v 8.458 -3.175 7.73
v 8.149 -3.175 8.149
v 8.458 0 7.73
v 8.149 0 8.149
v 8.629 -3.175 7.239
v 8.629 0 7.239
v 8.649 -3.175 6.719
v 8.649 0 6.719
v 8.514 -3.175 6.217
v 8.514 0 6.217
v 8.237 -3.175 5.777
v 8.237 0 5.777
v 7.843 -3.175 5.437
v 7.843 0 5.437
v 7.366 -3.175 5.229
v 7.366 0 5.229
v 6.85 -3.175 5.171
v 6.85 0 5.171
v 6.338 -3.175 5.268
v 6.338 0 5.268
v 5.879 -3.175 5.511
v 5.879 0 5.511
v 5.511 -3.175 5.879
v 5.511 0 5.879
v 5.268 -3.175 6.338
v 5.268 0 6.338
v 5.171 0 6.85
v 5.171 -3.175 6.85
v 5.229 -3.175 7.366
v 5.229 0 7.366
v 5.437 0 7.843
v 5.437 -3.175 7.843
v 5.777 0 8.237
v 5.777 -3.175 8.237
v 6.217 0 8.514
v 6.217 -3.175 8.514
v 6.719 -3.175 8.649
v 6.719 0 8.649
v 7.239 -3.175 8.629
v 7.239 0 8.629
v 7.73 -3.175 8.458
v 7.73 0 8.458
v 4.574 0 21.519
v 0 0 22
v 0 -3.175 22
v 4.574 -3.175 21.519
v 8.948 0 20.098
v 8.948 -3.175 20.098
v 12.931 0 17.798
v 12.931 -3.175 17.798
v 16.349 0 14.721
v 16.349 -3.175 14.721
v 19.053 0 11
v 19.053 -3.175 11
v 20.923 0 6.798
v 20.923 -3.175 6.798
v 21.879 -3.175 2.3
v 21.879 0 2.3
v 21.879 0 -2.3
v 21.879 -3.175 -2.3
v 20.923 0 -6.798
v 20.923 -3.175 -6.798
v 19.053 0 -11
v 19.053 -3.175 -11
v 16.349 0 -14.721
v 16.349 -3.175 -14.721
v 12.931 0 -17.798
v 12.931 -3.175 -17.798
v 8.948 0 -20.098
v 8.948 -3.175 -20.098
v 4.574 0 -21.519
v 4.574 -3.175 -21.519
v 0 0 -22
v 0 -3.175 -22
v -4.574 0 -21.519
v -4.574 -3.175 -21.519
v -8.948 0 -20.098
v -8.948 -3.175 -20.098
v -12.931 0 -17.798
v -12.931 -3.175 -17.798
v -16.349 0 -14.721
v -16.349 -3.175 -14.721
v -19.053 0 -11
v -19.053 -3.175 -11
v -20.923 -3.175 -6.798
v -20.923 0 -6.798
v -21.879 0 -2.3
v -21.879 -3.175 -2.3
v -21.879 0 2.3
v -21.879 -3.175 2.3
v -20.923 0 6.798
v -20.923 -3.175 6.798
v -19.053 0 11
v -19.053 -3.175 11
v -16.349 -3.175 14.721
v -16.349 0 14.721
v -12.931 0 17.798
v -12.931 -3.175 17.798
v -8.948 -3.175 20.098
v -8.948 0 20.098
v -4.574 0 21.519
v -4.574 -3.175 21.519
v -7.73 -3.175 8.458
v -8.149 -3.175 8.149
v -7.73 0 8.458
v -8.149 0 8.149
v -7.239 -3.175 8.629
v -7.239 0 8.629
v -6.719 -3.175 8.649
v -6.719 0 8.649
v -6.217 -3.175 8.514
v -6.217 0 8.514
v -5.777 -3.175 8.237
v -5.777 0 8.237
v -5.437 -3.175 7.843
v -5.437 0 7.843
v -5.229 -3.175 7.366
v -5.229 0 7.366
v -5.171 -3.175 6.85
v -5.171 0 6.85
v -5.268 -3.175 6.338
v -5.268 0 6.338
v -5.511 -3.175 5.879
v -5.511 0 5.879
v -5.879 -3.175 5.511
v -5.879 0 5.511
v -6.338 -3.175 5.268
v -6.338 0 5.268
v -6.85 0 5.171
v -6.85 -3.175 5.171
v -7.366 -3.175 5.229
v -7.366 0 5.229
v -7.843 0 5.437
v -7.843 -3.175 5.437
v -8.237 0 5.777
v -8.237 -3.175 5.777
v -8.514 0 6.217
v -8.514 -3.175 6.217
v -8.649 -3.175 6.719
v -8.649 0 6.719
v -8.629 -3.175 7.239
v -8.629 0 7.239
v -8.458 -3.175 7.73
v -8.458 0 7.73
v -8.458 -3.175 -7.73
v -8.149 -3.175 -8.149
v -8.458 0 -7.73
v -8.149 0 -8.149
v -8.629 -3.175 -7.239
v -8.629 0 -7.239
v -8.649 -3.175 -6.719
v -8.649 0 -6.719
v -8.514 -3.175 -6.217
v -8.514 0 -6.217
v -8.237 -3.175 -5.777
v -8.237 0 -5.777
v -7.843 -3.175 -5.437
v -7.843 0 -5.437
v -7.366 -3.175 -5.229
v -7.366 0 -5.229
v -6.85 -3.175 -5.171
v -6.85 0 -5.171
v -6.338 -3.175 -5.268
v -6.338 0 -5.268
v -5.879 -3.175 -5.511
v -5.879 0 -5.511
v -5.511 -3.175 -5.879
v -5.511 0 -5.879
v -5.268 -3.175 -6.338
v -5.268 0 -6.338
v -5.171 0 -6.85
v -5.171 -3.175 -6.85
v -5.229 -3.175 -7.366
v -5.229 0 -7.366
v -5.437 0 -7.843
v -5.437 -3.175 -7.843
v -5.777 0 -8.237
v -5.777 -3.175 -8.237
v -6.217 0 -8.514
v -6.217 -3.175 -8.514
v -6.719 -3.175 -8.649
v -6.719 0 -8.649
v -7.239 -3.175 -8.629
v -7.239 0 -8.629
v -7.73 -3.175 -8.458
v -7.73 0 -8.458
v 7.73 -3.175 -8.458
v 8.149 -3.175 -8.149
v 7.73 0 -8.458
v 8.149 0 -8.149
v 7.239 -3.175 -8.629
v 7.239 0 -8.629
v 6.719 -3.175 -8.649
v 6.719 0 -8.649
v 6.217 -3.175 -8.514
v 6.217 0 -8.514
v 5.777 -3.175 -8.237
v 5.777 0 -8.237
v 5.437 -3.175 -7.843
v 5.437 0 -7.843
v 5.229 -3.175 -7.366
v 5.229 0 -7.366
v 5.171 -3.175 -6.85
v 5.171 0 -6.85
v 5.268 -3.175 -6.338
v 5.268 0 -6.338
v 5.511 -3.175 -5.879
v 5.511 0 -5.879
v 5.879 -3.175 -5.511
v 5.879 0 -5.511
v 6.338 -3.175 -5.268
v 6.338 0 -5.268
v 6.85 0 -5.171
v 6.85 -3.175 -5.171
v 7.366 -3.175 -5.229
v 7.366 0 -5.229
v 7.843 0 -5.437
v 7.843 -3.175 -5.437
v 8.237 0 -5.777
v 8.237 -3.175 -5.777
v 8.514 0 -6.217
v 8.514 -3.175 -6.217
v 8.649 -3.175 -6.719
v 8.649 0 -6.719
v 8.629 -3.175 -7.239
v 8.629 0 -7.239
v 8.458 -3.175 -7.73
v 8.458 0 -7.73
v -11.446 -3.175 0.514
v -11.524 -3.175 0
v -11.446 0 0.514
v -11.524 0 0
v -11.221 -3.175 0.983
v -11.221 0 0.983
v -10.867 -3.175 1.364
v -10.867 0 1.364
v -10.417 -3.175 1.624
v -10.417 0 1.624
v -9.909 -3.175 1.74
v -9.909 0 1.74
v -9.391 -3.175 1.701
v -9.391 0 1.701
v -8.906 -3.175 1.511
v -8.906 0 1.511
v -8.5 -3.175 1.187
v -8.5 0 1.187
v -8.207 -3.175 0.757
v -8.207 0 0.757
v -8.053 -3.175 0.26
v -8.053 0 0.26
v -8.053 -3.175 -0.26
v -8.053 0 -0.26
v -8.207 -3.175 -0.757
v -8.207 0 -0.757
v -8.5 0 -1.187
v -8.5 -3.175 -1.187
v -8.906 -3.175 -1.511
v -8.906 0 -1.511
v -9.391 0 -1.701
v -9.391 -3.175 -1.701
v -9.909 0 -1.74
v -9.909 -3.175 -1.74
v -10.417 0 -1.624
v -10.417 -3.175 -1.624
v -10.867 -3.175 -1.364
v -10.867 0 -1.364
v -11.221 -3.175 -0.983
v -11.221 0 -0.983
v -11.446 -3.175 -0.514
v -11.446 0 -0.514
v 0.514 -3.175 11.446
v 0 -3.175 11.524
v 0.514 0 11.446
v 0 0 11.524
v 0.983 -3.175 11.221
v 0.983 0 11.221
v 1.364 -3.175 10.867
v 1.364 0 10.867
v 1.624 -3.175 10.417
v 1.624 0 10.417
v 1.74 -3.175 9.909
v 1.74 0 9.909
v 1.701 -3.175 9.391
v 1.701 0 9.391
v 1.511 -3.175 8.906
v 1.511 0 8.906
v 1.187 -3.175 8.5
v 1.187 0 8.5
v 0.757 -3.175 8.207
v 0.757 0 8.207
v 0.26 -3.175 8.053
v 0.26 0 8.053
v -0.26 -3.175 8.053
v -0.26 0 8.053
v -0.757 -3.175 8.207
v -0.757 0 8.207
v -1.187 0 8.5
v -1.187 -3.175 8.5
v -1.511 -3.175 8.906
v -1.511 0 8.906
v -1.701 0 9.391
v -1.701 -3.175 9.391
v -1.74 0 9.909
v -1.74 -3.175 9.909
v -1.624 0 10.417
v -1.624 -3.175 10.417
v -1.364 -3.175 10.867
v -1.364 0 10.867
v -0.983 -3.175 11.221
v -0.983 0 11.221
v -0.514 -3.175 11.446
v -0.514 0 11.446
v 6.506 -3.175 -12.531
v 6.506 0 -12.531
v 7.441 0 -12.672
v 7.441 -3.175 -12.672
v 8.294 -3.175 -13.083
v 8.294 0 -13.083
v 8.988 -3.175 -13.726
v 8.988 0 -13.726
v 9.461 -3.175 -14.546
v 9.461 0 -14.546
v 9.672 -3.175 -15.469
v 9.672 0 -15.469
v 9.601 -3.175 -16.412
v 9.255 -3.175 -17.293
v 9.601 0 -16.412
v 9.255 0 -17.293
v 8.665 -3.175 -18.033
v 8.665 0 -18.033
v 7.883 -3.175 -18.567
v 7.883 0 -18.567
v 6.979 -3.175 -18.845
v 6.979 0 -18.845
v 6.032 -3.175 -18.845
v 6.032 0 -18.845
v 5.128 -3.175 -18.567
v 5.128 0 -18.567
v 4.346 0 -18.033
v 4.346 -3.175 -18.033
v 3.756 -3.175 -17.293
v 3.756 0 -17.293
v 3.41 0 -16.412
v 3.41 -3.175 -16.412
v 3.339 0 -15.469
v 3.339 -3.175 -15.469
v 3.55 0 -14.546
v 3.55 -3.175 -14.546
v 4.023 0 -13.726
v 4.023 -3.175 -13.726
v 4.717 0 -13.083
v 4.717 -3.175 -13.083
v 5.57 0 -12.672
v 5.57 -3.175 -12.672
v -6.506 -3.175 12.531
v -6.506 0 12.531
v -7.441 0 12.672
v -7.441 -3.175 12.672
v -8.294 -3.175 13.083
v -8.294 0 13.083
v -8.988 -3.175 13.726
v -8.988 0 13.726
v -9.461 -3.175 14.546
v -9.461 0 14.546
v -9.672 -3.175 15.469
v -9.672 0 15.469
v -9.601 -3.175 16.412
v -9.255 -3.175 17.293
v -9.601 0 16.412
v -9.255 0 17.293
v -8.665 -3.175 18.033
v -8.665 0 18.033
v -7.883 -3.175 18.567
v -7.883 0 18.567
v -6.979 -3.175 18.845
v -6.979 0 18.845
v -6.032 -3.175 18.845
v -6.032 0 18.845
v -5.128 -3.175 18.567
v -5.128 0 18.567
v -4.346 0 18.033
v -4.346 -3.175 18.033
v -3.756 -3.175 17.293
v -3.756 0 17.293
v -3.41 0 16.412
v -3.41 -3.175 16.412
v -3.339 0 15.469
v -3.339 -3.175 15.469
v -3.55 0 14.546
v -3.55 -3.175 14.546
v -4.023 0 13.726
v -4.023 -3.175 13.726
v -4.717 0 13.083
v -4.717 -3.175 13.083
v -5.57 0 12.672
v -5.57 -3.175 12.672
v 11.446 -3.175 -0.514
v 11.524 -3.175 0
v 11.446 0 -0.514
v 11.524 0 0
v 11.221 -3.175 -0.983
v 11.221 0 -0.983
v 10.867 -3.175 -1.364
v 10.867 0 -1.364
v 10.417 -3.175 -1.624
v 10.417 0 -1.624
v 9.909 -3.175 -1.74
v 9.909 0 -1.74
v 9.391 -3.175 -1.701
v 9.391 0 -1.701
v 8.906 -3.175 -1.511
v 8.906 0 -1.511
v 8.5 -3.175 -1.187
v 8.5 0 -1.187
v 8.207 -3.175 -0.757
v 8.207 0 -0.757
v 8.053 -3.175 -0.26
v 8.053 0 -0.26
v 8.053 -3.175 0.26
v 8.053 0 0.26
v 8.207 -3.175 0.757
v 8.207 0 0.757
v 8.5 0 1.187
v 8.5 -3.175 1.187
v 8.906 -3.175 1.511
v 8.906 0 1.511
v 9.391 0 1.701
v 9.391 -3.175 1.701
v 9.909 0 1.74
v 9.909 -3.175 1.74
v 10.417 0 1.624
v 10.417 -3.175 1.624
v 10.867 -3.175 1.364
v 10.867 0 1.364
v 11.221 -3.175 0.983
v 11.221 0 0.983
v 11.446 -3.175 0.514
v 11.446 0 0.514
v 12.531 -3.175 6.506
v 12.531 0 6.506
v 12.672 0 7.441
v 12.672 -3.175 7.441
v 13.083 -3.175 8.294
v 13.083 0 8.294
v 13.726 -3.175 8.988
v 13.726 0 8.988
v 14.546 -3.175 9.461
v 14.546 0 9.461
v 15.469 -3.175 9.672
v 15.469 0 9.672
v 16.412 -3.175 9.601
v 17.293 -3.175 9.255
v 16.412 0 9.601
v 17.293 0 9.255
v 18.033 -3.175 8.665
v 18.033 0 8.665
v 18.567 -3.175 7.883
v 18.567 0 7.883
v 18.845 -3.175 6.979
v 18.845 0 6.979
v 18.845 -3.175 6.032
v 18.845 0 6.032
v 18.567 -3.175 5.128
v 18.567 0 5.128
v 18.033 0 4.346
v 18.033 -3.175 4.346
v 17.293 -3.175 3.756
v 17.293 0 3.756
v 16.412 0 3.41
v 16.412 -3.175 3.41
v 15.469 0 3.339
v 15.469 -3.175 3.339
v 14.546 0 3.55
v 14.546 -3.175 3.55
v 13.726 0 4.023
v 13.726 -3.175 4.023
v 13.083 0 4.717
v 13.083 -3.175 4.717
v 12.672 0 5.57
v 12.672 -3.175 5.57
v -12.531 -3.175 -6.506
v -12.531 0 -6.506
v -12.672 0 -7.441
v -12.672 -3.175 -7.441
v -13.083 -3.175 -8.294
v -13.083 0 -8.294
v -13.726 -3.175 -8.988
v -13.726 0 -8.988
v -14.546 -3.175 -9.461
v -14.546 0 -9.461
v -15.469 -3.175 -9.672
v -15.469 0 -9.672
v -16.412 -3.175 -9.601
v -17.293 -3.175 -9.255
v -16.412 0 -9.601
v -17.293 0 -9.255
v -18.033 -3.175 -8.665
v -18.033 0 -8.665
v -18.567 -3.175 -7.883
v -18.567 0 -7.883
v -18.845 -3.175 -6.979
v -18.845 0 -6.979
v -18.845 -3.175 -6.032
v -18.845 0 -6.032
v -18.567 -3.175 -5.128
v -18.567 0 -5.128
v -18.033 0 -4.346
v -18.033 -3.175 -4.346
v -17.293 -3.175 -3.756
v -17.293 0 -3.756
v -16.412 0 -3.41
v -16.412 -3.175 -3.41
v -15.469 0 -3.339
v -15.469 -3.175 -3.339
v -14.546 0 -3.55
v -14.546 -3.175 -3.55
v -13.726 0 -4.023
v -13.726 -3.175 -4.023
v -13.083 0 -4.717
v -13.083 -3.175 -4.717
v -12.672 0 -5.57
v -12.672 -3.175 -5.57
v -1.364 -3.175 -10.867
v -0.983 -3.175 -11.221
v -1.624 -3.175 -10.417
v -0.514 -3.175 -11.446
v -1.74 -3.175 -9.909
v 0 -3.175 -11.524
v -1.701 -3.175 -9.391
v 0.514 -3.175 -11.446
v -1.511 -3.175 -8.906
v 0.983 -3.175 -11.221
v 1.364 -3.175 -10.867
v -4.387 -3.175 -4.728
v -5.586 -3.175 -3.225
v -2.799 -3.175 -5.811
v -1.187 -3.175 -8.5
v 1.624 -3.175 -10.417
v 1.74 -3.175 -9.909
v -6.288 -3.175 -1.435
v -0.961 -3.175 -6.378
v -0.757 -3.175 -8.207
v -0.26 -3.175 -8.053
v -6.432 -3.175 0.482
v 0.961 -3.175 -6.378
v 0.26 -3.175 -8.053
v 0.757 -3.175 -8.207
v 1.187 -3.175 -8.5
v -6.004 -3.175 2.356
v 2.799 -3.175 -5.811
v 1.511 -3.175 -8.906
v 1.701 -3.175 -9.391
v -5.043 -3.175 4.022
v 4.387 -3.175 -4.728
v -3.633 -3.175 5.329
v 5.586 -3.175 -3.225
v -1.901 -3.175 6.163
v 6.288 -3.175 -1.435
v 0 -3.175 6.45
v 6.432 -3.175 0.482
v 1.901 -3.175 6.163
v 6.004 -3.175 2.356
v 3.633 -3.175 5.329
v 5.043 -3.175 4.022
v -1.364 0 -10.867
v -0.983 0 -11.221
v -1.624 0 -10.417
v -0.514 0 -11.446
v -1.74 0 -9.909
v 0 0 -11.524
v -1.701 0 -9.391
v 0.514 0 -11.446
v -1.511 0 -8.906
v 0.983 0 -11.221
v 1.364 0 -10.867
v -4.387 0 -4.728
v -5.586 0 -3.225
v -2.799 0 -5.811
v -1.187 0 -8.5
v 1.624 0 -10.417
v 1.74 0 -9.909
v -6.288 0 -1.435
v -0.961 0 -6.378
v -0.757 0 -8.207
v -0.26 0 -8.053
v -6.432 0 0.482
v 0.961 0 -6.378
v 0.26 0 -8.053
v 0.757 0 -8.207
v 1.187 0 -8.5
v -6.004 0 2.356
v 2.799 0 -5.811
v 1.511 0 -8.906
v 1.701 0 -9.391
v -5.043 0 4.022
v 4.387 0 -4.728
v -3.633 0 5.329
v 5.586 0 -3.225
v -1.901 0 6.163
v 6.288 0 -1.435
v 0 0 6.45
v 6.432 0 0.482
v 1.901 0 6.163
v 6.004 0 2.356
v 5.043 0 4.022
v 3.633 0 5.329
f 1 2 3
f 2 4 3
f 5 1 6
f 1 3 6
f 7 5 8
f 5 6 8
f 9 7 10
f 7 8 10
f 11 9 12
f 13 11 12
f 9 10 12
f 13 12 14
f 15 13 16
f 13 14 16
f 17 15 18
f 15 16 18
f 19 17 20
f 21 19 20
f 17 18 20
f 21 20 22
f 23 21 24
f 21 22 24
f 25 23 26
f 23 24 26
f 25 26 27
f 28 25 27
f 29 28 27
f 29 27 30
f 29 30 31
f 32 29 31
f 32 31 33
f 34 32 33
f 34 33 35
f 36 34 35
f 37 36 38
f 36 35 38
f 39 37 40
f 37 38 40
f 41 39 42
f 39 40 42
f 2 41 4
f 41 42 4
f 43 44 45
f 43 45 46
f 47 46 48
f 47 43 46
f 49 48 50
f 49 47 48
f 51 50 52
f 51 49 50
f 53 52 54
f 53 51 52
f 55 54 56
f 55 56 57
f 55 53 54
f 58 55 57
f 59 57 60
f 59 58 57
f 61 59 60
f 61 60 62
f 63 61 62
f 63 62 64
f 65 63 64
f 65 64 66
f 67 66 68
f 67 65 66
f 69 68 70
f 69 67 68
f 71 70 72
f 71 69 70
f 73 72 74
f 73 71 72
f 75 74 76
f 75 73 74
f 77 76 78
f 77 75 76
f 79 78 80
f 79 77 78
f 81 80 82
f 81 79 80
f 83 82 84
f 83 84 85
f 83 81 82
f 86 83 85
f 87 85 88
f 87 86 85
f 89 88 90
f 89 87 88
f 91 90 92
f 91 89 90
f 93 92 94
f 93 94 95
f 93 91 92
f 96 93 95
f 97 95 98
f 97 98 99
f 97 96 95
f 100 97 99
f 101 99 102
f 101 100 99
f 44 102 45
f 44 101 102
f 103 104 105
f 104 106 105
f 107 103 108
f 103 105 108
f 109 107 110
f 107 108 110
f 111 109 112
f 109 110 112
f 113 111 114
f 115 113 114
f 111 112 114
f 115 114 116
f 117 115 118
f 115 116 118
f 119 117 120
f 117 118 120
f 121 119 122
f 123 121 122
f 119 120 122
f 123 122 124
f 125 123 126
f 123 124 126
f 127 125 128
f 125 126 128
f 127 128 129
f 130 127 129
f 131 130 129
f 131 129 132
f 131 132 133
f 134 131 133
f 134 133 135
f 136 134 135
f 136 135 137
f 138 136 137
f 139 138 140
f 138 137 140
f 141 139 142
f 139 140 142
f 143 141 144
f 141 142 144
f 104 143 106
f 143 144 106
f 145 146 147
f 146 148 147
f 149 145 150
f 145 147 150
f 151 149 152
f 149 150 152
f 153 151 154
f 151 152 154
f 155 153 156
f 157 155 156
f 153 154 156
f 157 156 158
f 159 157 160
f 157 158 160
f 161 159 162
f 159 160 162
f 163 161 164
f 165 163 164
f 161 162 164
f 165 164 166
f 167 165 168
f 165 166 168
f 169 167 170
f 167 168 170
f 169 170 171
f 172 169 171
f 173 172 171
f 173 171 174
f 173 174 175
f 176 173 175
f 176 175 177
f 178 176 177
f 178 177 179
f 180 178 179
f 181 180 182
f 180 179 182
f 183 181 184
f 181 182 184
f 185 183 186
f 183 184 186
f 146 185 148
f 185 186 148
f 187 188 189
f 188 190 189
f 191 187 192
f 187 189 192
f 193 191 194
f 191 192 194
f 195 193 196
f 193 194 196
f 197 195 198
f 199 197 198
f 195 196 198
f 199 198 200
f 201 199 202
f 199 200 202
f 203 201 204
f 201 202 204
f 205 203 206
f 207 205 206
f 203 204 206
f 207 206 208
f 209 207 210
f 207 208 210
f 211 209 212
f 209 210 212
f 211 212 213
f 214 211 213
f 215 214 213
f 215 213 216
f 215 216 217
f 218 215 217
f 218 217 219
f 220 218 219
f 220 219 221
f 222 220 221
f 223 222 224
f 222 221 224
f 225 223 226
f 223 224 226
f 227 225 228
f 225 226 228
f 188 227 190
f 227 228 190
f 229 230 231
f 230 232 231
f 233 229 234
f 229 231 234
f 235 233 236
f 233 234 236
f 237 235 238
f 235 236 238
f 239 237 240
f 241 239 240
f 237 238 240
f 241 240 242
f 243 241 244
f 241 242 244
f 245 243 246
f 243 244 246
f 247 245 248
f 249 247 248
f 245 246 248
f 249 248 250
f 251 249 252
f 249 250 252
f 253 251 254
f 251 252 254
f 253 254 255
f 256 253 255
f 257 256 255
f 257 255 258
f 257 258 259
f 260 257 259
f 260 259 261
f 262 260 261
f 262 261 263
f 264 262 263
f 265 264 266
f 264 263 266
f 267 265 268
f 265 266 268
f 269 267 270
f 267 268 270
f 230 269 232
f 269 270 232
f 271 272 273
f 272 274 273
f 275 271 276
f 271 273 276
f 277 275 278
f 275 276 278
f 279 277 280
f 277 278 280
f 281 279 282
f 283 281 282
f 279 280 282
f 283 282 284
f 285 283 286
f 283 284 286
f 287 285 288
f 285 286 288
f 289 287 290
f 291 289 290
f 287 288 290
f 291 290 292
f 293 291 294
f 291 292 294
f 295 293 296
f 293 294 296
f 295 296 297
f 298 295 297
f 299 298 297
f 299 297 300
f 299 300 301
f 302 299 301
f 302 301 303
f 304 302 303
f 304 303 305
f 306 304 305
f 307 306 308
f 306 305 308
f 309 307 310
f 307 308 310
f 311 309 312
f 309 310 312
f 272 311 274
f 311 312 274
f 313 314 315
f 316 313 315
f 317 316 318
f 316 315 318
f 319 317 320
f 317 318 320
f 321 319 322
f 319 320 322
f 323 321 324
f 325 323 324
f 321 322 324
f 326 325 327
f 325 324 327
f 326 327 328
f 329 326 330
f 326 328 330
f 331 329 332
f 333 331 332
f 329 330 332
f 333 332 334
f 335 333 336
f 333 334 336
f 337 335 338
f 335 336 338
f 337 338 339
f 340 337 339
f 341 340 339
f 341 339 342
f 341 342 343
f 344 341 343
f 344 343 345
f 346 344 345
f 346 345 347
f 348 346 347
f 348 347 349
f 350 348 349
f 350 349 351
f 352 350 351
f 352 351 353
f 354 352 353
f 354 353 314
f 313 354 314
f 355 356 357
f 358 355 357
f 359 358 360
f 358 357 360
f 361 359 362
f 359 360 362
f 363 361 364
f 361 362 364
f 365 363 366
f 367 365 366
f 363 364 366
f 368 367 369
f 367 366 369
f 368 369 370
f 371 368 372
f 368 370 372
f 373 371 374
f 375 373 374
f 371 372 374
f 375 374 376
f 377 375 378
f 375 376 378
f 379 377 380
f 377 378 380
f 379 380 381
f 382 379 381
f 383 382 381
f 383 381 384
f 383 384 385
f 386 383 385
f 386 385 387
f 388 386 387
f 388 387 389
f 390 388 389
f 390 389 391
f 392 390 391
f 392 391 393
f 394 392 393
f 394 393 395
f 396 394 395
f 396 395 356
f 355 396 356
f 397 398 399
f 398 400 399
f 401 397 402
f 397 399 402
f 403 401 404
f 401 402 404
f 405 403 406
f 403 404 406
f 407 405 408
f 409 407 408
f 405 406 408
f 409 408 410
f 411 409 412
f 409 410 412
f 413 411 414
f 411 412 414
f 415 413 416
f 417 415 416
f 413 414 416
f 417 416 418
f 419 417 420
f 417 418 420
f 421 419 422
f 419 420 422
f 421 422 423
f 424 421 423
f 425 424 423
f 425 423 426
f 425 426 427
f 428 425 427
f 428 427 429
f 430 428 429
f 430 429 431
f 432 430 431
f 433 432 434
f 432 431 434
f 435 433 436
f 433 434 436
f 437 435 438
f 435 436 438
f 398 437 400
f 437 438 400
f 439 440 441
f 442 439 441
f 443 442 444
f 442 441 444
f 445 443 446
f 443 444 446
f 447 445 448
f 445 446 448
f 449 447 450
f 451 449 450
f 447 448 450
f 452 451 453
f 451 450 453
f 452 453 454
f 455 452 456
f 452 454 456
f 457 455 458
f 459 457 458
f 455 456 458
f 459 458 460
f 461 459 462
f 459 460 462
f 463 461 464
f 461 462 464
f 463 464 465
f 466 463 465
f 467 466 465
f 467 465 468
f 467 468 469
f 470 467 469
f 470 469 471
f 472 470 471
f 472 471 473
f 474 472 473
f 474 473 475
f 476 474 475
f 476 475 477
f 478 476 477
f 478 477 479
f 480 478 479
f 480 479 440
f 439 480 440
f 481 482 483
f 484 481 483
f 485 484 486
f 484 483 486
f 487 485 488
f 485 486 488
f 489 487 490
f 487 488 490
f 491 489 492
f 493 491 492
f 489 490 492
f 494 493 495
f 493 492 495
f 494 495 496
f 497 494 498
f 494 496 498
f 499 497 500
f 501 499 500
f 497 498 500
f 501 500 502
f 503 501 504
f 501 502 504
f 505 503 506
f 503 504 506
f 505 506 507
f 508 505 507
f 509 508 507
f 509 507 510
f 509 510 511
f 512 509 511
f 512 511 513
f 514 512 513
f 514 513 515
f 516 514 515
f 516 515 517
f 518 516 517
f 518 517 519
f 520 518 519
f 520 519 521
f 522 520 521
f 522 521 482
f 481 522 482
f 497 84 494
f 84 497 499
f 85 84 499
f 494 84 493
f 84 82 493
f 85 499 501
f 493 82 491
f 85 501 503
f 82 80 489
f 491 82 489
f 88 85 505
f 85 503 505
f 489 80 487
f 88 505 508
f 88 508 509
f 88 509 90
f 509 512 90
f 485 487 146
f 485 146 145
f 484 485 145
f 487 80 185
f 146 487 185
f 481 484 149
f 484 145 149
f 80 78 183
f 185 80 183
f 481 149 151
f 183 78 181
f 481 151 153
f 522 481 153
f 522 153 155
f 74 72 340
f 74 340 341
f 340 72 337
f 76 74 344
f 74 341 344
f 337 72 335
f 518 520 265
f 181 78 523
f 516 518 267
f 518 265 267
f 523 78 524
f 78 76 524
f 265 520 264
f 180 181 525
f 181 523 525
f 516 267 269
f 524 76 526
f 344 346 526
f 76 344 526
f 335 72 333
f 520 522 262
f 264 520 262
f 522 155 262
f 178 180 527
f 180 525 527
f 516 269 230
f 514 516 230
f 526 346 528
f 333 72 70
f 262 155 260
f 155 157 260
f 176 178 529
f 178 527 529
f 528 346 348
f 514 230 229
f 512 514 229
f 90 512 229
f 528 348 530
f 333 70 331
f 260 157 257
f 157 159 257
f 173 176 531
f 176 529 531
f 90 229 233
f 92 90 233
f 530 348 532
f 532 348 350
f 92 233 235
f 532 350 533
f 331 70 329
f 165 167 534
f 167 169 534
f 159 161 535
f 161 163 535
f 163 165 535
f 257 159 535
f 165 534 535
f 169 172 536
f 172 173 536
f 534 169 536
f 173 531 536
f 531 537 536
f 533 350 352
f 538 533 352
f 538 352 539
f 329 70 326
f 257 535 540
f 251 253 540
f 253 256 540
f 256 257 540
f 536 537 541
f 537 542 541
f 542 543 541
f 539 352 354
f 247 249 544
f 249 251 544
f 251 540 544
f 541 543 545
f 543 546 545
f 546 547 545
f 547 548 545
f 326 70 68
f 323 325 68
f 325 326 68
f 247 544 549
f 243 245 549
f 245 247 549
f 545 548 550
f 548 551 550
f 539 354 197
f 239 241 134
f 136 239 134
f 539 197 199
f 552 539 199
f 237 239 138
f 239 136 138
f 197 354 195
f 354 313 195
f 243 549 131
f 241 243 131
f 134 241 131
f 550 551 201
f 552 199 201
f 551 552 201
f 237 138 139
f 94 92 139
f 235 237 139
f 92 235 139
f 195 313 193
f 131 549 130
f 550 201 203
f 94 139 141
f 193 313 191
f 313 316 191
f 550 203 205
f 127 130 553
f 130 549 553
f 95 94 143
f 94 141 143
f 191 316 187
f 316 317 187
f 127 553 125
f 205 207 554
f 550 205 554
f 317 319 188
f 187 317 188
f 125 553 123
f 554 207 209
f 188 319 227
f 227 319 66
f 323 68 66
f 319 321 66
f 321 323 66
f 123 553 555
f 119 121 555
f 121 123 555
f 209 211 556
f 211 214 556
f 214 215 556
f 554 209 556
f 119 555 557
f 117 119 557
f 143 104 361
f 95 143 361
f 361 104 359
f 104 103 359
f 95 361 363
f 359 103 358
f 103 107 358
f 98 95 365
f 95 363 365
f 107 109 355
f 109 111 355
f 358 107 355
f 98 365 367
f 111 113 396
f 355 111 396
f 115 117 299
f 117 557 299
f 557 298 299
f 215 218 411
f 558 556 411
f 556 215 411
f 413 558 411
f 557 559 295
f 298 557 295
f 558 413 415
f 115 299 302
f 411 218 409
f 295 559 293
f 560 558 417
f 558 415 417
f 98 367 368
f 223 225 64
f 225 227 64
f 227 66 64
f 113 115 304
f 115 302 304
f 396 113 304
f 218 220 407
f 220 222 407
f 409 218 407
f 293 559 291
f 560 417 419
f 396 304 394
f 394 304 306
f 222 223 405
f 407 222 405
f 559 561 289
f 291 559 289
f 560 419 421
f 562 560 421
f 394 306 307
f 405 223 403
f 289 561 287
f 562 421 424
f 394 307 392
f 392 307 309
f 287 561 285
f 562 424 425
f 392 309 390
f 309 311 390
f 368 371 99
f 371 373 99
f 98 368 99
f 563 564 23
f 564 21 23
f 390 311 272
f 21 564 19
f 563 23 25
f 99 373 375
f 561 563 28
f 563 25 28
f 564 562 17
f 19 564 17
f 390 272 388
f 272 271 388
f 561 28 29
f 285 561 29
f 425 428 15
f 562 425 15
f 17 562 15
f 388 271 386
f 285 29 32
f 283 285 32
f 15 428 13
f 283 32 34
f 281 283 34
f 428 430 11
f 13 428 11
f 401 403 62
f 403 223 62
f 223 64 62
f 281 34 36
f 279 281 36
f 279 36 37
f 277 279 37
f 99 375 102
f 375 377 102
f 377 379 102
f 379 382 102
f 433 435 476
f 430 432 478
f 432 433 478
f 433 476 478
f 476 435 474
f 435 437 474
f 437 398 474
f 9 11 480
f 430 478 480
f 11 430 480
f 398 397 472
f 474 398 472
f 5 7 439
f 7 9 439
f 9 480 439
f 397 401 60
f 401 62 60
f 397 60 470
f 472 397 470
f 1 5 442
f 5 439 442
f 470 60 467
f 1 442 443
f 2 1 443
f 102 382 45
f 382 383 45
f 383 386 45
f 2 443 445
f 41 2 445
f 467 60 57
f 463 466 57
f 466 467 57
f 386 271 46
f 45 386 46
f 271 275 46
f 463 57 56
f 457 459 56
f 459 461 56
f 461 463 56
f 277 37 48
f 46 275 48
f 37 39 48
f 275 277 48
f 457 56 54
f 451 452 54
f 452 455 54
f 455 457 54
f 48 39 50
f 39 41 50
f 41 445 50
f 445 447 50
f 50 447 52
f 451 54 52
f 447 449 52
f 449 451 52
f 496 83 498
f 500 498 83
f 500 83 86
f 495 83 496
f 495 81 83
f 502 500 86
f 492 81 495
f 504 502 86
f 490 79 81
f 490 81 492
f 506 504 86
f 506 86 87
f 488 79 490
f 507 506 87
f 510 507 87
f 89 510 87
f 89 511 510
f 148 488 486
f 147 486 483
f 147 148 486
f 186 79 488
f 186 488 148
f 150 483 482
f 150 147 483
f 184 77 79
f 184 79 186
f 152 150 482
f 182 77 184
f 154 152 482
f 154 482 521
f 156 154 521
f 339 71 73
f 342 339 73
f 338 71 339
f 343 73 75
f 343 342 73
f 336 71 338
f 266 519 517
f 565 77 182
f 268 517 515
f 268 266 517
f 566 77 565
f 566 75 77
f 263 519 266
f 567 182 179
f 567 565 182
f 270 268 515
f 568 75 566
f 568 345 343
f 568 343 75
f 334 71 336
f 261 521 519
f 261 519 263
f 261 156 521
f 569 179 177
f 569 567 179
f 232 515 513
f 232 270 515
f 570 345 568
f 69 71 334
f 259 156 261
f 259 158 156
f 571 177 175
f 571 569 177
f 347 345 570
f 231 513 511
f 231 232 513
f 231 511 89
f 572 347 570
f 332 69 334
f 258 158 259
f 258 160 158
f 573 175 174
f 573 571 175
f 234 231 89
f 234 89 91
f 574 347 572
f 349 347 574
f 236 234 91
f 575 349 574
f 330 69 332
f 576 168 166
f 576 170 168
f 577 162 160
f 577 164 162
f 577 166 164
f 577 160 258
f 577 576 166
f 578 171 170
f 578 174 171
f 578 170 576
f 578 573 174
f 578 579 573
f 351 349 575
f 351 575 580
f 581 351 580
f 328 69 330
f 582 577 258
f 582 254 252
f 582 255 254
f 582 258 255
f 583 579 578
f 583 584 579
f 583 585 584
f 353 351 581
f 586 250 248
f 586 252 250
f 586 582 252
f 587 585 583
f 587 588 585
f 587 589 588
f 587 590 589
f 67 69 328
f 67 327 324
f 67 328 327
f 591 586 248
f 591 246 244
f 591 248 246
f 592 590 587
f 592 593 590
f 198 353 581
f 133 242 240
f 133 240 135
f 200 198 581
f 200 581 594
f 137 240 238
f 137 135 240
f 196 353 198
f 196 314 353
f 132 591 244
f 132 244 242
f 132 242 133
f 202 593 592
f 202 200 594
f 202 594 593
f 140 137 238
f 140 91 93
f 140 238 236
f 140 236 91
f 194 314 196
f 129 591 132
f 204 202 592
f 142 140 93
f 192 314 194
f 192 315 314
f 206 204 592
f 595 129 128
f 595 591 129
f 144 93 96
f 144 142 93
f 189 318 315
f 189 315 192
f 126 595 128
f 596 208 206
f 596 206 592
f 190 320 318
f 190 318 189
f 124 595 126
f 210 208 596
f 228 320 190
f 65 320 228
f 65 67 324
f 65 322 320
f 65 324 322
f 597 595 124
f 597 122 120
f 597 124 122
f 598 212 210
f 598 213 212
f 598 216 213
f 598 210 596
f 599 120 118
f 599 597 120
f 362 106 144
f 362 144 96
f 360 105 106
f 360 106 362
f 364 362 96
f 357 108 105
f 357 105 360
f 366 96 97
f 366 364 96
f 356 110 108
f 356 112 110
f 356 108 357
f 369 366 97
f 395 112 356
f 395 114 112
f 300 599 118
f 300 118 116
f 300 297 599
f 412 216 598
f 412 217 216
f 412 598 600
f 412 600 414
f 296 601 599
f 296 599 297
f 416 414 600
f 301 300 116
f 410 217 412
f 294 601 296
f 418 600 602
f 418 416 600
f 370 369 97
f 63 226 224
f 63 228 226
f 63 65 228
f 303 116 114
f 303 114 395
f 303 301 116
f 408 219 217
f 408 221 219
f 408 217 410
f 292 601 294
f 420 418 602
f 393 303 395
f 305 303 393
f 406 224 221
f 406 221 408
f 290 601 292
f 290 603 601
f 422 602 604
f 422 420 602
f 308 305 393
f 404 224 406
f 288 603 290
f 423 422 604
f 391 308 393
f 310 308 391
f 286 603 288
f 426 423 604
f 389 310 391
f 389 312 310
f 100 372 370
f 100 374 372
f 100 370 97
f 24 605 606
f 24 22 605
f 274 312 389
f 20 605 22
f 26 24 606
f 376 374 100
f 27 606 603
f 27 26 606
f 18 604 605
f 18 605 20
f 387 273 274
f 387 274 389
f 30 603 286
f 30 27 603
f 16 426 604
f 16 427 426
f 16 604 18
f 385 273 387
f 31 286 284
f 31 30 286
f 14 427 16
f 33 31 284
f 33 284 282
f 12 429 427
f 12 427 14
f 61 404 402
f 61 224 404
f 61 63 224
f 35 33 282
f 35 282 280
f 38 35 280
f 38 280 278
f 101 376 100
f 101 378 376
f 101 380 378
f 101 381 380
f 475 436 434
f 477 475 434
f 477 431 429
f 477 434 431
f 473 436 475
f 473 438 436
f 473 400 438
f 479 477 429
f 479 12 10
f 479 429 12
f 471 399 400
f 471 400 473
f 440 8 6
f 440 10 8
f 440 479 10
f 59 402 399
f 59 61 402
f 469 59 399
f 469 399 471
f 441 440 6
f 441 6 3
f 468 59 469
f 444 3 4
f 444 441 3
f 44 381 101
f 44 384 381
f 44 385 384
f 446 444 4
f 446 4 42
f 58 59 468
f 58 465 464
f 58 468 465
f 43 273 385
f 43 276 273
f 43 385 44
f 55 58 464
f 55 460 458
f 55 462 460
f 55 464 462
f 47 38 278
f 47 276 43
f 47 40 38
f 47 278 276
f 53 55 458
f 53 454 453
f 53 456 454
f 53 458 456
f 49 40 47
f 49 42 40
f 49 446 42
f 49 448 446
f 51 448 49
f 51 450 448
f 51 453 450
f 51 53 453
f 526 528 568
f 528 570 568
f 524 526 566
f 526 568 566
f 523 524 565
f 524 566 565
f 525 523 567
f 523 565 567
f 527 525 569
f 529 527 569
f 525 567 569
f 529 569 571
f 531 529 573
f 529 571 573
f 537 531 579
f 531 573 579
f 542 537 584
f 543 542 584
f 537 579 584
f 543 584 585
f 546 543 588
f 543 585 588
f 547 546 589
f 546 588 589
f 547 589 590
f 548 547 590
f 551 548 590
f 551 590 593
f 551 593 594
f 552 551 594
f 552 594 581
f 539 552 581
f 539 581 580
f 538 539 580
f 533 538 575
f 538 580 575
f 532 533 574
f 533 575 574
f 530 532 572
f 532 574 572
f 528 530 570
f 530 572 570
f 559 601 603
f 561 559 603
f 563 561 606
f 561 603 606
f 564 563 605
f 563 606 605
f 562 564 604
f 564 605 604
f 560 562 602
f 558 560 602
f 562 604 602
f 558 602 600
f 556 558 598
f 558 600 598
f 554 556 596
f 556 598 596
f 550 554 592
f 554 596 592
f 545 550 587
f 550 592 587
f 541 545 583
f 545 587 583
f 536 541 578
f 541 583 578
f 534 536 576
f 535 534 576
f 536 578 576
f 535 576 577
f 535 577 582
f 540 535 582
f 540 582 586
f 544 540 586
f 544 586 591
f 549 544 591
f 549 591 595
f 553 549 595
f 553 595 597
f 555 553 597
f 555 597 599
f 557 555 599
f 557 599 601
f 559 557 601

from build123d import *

# Parameters (mm, degrees)
SKETCH1_R           = 22
BOSS_EXTRUDE1_DEPTH = 3.175
SKETCH4_R           = 1.745
CUT_EXTRUDE2_DEPTH  = 32.274280567
SKETCH2_R           = 6.45
CUT_EXTRUDE4_DEPTH  = 32.274280567
CIRPATTERN1_COUNT   = 8
SKETCH5_R           = 3.175
CUT_EXTRUDE5_DEPTH  = 32.274280567
CIRPATTERN2_COUNT   = 4


with BuildPart() as part:
    # Sketch1 → Boss-Extrude1 (new body)
    with BuildSketch(Plane(origin=(0, 0, 0), x_dir=(1, 0, 0), z_dir=(0, 1, 0))):
        with Locations(Location((0, 0, 0), (0, 0, 270))):
            Circle(SKETCH1_R)
    extrude(amount=-BOSS_EXTRUDE1_DEPTH)

    # Sketch4 → Cut-Extrude2 (cut, symmetric)
    with BuildSketch(Plane(origin=(0, 0, 0), x_dir=(1, 0, 0), z_dir=(0, 1, 0))):
        with Locations(Location((0, -9.779, 0), (0, 0, 270))):
            Circle(SKETCH4_R)
    cut_extrude2 = extrude(amount=CUT_EXTRUDE2_DEPTH, both=True, mode=Mode.SUBTRACT)

    # Sketch2 → Cut-Extrude4 (cut, through all)
    with BuildSketch(Plane(origin=(0, 0, 0), x_dir=(1, 0, 0), z_dir=(0, 1, 0))):
        with Locations(Location((0, 0, 0), (0, 0, 270))):
            Circle(SKETCH2_R)
    extrude(amount=-CUT_EXTRUDE4_DEPTH, mode=Mode.SUBTRACT)

    # CirPattern1: Cut-Extrude2 ×8 about axis
    cirpattern1_axis = Axis((0, 0, 0), (0, 1, 0))
    for i in range(1, CIRPATTERN1_COUNT):
        add(cut_extrude2.rotate(cirpattern1_axis, i * 360 / CIRPATTERN1_COUNT), mode=Mode.SUBTRACT)

    # Sketch5 → Cut-Extrude5 (cut, through all)
    with BuildSketch(Plane(origin=(0, 0, 0), x_dir=(1, 0, 0), z_dir=(0, 1, 0))):
        with Locations(Location((6.50561835, 15.705952053, 0), (0, 0, 270))):
            Circle(SKETCH5_R)
    cut_extrude5 = extrude(amount=-CUT_EXTRUDE5_DEPTH, mode=Mode.SUBTRACT)

    # CirPattern2: Cut-Extrude5 ×4 about axis
    cirpattern2_axis = Axis((0, 0, 0), (0, 1, 0))
    for i in range(1, CIRPATTERN2_COUNT):
        add(cut_extrude5.rotate(cirpattern2_axis, i * 360 / CIRPATTERN2_COUNT), mode=Mode.SUBTRACT)


solid = part.part
